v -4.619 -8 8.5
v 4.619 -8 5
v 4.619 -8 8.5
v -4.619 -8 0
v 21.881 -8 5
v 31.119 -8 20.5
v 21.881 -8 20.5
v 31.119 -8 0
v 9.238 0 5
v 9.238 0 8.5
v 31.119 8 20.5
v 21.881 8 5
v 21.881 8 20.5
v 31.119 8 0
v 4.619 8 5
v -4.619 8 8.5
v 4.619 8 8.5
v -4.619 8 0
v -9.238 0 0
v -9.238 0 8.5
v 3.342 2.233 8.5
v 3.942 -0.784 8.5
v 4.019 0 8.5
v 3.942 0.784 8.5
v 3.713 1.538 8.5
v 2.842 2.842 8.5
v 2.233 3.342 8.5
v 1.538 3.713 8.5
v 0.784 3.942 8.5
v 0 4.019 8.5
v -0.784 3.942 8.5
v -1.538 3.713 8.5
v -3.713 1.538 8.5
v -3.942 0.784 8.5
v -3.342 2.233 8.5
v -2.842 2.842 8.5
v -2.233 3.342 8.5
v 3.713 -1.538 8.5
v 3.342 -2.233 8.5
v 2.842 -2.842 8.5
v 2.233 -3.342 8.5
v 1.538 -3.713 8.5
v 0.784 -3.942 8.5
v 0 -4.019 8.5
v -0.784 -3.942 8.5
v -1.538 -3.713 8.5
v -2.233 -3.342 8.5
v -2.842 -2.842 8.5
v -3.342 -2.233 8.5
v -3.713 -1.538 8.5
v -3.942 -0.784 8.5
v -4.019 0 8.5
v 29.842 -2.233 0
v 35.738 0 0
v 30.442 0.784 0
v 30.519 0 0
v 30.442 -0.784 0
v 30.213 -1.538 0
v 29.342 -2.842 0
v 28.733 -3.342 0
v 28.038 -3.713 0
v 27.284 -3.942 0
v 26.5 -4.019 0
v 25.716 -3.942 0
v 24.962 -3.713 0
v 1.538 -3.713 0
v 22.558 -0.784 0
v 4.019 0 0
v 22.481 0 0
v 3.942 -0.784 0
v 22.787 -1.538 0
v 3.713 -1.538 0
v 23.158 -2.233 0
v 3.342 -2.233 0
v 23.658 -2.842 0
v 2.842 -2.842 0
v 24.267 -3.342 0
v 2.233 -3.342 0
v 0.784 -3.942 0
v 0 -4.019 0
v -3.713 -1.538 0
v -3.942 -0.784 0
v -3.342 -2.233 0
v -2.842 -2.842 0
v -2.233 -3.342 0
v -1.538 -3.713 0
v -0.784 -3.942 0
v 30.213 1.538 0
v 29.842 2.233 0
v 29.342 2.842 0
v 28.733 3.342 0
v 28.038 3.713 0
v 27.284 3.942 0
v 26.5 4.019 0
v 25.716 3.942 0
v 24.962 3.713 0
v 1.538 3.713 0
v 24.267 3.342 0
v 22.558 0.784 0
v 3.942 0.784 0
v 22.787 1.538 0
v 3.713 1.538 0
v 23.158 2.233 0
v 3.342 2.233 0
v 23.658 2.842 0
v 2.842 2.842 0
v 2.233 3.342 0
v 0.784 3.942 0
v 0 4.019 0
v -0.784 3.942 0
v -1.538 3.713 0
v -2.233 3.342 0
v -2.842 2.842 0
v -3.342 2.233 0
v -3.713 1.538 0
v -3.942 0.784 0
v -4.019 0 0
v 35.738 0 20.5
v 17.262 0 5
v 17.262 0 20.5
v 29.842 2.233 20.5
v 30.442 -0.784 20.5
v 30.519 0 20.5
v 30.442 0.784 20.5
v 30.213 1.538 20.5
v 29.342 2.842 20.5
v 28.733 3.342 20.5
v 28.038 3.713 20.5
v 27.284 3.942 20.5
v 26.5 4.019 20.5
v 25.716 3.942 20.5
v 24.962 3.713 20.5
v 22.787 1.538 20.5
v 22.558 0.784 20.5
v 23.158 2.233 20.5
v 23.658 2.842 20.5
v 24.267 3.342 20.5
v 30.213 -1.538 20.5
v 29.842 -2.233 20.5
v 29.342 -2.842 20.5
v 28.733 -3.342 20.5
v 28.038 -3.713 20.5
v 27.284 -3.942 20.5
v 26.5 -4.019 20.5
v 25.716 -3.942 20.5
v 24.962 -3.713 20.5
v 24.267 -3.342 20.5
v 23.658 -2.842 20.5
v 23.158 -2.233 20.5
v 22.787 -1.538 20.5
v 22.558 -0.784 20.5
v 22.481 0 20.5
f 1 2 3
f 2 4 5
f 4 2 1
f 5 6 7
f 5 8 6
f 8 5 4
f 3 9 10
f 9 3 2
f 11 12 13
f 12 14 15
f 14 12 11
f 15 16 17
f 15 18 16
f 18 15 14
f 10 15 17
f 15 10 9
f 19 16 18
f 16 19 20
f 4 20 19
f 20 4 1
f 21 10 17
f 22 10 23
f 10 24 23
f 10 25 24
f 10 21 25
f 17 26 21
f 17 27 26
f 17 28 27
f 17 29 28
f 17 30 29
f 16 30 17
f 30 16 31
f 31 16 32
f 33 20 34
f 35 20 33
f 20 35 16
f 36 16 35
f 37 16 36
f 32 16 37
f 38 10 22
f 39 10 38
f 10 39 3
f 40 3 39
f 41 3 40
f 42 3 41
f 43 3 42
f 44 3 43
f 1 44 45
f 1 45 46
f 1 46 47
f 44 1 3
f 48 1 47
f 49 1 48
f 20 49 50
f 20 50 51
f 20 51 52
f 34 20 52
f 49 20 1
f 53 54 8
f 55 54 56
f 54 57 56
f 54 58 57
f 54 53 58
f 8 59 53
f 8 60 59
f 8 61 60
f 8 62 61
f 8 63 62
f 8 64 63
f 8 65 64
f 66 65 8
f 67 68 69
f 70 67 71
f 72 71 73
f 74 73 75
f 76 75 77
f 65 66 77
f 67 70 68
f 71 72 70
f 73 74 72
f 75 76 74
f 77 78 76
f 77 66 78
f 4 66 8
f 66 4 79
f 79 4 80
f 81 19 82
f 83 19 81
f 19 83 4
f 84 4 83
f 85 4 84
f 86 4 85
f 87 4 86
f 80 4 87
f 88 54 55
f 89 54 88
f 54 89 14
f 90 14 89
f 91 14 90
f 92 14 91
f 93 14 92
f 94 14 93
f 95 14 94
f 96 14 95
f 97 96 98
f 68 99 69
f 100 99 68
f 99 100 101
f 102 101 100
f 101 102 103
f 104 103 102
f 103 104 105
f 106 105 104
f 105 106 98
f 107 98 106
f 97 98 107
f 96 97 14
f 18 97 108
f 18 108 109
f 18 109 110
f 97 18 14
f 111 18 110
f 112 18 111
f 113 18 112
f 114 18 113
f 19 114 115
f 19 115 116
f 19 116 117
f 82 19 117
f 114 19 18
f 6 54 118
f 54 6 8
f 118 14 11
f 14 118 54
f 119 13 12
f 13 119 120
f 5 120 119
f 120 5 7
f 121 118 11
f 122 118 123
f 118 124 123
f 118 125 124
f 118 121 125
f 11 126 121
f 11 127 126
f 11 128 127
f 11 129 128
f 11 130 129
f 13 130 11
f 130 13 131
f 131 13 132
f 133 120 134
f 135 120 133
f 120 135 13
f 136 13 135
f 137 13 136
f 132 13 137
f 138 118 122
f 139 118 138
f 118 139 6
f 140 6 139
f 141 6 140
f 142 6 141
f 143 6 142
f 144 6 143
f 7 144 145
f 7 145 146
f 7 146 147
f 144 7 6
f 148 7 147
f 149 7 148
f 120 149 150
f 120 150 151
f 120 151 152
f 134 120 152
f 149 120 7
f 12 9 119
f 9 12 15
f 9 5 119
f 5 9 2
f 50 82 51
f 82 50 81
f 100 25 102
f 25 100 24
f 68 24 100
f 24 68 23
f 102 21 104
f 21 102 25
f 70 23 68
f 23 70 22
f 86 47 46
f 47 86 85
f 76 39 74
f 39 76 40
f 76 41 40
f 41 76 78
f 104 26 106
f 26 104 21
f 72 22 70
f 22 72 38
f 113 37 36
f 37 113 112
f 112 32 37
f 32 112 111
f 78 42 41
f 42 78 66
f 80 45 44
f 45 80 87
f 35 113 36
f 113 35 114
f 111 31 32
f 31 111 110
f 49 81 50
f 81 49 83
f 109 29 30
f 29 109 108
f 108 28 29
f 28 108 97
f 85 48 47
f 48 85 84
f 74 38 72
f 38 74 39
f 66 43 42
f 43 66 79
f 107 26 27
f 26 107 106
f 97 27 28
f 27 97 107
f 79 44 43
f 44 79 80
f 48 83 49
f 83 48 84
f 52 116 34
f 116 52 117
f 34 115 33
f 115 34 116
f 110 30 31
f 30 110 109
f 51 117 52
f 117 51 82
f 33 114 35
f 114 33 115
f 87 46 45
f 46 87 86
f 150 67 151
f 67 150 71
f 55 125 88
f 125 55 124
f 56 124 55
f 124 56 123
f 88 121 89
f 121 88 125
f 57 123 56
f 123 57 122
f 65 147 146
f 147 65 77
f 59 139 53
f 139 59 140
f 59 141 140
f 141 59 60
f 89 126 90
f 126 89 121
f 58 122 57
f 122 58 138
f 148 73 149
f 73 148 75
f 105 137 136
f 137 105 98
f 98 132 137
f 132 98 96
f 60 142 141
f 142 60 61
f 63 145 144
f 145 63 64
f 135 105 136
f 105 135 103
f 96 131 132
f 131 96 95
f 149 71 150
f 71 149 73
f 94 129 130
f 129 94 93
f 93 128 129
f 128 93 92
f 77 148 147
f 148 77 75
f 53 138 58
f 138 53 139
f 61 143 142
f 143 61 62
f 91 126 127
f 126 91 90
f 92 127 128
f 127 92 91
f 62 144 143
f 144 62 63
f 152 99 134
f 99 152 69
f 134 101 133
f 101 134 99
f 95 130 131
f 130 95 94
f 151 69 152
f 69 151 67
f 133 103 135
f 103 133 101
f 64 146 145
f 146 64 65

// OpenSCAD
// file: vars.scad
// Variables used throughout design.
// Yes, these could use some commenting.
// (c) 2014, Christopher "ScribbleJ" Jansen
huge=500;

printer_w = 400;
printer_l = 400;
printer_h = 400;

bearing_w = 7;
bearing_d = 22;
bearing_r = bearing_d/2;
bearing_hole_d = 8;
bearing_hole_r = bearing_hole_d/2;


misc_bolt_d = 3.2;
misc_bolt_r = misc_bolt_d/2;
misc_nut_r  = misc_bolt_d;
misc_bolt_pitch = 0.5;
misc_bolthead_d = misc_bolt_d*2;
misc_bolthead_r = misc_bolthead_d/2;

retainer_shell_thick = 0.5;
retainer_shell_sep   = 0.25;
//retainer_lip_thick   = 1;
retainer_lip_thick   = 2;
retainer_inner_width = 1;

belt_w    = 6;
belt_thick= 2;
belt_sep  = retainer_lip_thick*2 + 2;

calc_retainer_h  = retainer_lip_thick*2 + belt_w;
calc_retainer_ir = bearing_r + retainer_shell_thick*2 + retainer_shell_sep;
calc_retainer_or = calc_retainer_ir + belt_thick;
calc_retainer_b_off = retainer_lip_thick - (bearing_w-belt_w)/2;

tslot_w = 20;
tslot_bolt_d = 5;
tslot_bolt_r = tslot_bolt_d/2;
tslot_bolt_l = 4;
tslot_bolthead_d = 10;
tslot_bolthead_r = tslot_bolthead_d/2;


corner_thick = 5;
corner_length = tslot_w*3;

rod_d=8;
rod_r=rod_d/2;

bushing_d=15;
bushing_r=bushing_d/2;
bushing_l=10;
bushing_flange_r = bushing_r+3;
bushing_flange_w = 1;
bushing_material_thick = 5;

x_rod_sep = 50;
x_carriage_l = 50;
x_mount_sep_x = x_carriage_l - misc_bolthead_r*2*2 - misc_bolt_r*2;
x_mount_offset = bushing_r + misc_bolt_r * 2;
belt_above_x = bushing_r+misc_nut_r*2;
belt_clamp_w = 7;
x_rod_past_bearing = 20;

//belt_above_y = belt_above_x + x_rod_sep/2;
//y_above_x = belt_above_x-belt_above_y;
belt_above_y = 45;
y_above_x = belt_above_x-belt_above_y;




bearing_mount_base = corner_thick;
bearing_mount_extra = 2;
belt_above_bearing_mount = bearing_mount_base + bearing_mount_extra + retainer_lip_thick;
bearing_mount_support_tweak = 30;

y_bearing_offset = bushing_r+bushing_material_thick-calc_retainer_ir;

y_bearing_sep_y = calc_retainer_ir*2+belt_thick;
y_bearing_sep_z = belt_w+belt_sep;
bearing_bolt_r  = 4;
bearing_bolt_pitch = 1.25;
bearing_bolt_holder_thick = 4;
y_carriage_from_tslot = 2;

y_carriage_len = 50;

motor_w = 42.3;
motor_h = motor_w;
motor_bolt_sep = 31.0;
motor_bolt_r   = 1.5;
motor_pulley_d = 10;
motor_pulley_r = motor_pulley_d/2;
motor_pulley_h = 5.3;
motor_flange_d = 23;
motor_flange_r = motor_flange_d/2;
motor_corner_extra_hole_pos = tslot_bolt_r+3;

calc_corner_from_y_rod = x_rod_past_bearing+corner_thick+y_carriage_from_tslot+tslot_w;
calc_corner_above_x = belt_above_x - belt_above_bearing_mount + bearing_mount_base;

calc_motor1_above_x  = belt_above_x - motor_pulley_h;
calc_motor2_above_x  = belt_above_x - motor_pulley_h + belt_w + belt_sep;
calc_motor_from_y_rod = -bushing_r - bushing_material_thick + bearing_bolt_holder_thick + bearing_bolt_r + calc_retainer_or + motor_pulley_r;

motor_bracket_thick = 12;
motor_bracket_wide = (motor_w - motor_flange_d) / 2;
motor_bracket_len  = motor_w;
motor_bolt_offset  = (motor_w - motor_bolt_sep) / 2;

z_rod_sep = 150;
z_motor_off = motor_h - tslot_w - corner_thick;

laser_mat_thick = 4.75;
laser_mat_margin = laser_mat_thick;
bed_mount_sep   = 209;
bed_from_z      = 60;
bed_box_r       = 25;
bed_box_h       = 50;
z_ends_sep = printer_l - tslot_w*2 - corner_thick*2 - motor_w;
platform_l      =  laser_mat_margin*2 + laser_mat_thick*2 + bed_box_r*2 + z_ends_sep;
platform_w      = bed_mount_sep + misc_bolt_r*2 + laser_mat_margin*2;
z_leadscrew_passthrough_r = 12/2;
leadscrew_bolt_offset = 22/2;
leadscrew_bolt_r = 3.2/2;
laser_bushing_fudge = 0.1;


lm8uu_d=15;
lm8uu_r=lm8uu_d/2;
lm8uu_bolt_r=5/2;
lm8uu_nut_r=10/2;

arduino_width=60;
// file: common.scad
// Common functions used in various places throughout.
// (c) 2014, Christopher "ScribbleJ" Jansen
include <vars.scad>

// Reduce radius of holes intended to hold bolts by threads.
// 0.86603 * p = nominal depth of threads.  1/3-1/2 of that is about right.
function smallhole(r,p) = r - ((p*0.86603)/3);

// Polyhole derived from Nophead's Polyhole work: http://hydraraptor.blogspot.com/2011/02/polyholes.html
module polyhole(r,h,v=6,a=0)
{
  rotate([0,0,a]) cylinder( h = h, r = r  / cos( 180 / v ), $fn = v );
}
// 2D version of Polyhole
module polycircle(r,v=6,a=0)
{
  rotate([0,0,a]) circle(r = r  / cos( 180 / v ), $fn = v );
}
// Cutout for bolthole
module bolt(bolt_r = misc_bolt_r,bolthead_r = misc_bolthead_r,bolt_len = huge,v=6,a=0)
{
  translate([0,0,-bolt_len]) polyhole(r=bolt_r,h=bolt_len+1,v=v,a=a);
  polyhole(r=bolthead_r,h=huge,v=v,a=a);
}
// 2D ring
module ring(inner=5,outer=10,v=32)
{
  difference()
  {
    circle(r=outer);
    polycircle(r=inner,v=v);
  }
} 
// 2D Rounded square
module roundsquare(dim=[50,50],r=5)
{
  translate([0,r]) square([dim[0], dim[1] - r*2]);
  translate([r,0]) square([dim[0] - r*2, dim[1]]);
  for(x=[r,dim[0]-r])
  for(y=[r,dim[1]-r])
    translate([x,y]) circle(r=r);
}
// Lasercutting Tabs
module maketabs(l=100,w=5,num=10)
{
  tablength=l/(num * 2);
  for(x=[tablength/2:tablength*2:l])
    translate([x,0]) square([tablength,w]);
}
// Support for printing bearing mount
module support(l=bearing_mount_base+bearing_mount_extra+y_bearing_sep_z+calc_retainer_b_off,w=bearing_hole_d * tan(180/6) *2,extra=0,extra_l=0)
{
  translate([-w/2,0,-l]) 
  {
    difference()
    {
      rotate([45,0,0]) cube([w,huge/2,huge/2]);
      translate([-huge/2,0,0]) cube([huge,huge,huge]);
      translate([-huge/2,-huge/2,l]) cube([huge,huge,huge]);
    }
    translate([0,-extra,-extra_l/2]) cube([w,extra,extra_l]);
  }

}
// main file
// Bearing Mount Cap
// Optional cap for bearing mounts, print 4.
// (c) 2014, Christopher "ScribbleJ" Jansen
include <common.scad>

bearing_mount_cap();


module bearing_mount_cap(x_sep=y_bearing_sep_y,z_sep=y_bearing_sep_z,base_height=bearing_mount_base,extra_height=bearing_mount_extra,v=32,a=0)
{
  difference()
  {
    union()
    {
      rotate([0,0,a]) polyhole(r=bearing_bolt_r+bearing_bolt_holder_thick,h=calc_retainer_b_off+base_height+extra_height,$fn=v);
      translate([x_sep,0,0]) rotate([0,0,a]) polyhole(r=bearing_bolt_r+bearing_bolt_holder_thick, h=calc_retainer_b_off+z_sep+base_height+extra_height,$fn=v);
      translate([0,-(bearing_bolt_r+bearing_bolt_holder_thick),0]) cube([x_sep,(bearing_bolt_r+bearing_bolt_holder_thick)*2,base_height]);
    }

    translate([0,0,-1])
    {
      polyhole(r=bearing_bolt_r,h=calc_retainer_b_off+base_height+extra_height+2,v=v,a=a);
      translate([x_sep,0,0]) polyhole(r=bearing_bolt_r, h=calc_retainer_b_off+z_sep+base_height+extra_height+2,v=v,a=a);
    }


  }
}
